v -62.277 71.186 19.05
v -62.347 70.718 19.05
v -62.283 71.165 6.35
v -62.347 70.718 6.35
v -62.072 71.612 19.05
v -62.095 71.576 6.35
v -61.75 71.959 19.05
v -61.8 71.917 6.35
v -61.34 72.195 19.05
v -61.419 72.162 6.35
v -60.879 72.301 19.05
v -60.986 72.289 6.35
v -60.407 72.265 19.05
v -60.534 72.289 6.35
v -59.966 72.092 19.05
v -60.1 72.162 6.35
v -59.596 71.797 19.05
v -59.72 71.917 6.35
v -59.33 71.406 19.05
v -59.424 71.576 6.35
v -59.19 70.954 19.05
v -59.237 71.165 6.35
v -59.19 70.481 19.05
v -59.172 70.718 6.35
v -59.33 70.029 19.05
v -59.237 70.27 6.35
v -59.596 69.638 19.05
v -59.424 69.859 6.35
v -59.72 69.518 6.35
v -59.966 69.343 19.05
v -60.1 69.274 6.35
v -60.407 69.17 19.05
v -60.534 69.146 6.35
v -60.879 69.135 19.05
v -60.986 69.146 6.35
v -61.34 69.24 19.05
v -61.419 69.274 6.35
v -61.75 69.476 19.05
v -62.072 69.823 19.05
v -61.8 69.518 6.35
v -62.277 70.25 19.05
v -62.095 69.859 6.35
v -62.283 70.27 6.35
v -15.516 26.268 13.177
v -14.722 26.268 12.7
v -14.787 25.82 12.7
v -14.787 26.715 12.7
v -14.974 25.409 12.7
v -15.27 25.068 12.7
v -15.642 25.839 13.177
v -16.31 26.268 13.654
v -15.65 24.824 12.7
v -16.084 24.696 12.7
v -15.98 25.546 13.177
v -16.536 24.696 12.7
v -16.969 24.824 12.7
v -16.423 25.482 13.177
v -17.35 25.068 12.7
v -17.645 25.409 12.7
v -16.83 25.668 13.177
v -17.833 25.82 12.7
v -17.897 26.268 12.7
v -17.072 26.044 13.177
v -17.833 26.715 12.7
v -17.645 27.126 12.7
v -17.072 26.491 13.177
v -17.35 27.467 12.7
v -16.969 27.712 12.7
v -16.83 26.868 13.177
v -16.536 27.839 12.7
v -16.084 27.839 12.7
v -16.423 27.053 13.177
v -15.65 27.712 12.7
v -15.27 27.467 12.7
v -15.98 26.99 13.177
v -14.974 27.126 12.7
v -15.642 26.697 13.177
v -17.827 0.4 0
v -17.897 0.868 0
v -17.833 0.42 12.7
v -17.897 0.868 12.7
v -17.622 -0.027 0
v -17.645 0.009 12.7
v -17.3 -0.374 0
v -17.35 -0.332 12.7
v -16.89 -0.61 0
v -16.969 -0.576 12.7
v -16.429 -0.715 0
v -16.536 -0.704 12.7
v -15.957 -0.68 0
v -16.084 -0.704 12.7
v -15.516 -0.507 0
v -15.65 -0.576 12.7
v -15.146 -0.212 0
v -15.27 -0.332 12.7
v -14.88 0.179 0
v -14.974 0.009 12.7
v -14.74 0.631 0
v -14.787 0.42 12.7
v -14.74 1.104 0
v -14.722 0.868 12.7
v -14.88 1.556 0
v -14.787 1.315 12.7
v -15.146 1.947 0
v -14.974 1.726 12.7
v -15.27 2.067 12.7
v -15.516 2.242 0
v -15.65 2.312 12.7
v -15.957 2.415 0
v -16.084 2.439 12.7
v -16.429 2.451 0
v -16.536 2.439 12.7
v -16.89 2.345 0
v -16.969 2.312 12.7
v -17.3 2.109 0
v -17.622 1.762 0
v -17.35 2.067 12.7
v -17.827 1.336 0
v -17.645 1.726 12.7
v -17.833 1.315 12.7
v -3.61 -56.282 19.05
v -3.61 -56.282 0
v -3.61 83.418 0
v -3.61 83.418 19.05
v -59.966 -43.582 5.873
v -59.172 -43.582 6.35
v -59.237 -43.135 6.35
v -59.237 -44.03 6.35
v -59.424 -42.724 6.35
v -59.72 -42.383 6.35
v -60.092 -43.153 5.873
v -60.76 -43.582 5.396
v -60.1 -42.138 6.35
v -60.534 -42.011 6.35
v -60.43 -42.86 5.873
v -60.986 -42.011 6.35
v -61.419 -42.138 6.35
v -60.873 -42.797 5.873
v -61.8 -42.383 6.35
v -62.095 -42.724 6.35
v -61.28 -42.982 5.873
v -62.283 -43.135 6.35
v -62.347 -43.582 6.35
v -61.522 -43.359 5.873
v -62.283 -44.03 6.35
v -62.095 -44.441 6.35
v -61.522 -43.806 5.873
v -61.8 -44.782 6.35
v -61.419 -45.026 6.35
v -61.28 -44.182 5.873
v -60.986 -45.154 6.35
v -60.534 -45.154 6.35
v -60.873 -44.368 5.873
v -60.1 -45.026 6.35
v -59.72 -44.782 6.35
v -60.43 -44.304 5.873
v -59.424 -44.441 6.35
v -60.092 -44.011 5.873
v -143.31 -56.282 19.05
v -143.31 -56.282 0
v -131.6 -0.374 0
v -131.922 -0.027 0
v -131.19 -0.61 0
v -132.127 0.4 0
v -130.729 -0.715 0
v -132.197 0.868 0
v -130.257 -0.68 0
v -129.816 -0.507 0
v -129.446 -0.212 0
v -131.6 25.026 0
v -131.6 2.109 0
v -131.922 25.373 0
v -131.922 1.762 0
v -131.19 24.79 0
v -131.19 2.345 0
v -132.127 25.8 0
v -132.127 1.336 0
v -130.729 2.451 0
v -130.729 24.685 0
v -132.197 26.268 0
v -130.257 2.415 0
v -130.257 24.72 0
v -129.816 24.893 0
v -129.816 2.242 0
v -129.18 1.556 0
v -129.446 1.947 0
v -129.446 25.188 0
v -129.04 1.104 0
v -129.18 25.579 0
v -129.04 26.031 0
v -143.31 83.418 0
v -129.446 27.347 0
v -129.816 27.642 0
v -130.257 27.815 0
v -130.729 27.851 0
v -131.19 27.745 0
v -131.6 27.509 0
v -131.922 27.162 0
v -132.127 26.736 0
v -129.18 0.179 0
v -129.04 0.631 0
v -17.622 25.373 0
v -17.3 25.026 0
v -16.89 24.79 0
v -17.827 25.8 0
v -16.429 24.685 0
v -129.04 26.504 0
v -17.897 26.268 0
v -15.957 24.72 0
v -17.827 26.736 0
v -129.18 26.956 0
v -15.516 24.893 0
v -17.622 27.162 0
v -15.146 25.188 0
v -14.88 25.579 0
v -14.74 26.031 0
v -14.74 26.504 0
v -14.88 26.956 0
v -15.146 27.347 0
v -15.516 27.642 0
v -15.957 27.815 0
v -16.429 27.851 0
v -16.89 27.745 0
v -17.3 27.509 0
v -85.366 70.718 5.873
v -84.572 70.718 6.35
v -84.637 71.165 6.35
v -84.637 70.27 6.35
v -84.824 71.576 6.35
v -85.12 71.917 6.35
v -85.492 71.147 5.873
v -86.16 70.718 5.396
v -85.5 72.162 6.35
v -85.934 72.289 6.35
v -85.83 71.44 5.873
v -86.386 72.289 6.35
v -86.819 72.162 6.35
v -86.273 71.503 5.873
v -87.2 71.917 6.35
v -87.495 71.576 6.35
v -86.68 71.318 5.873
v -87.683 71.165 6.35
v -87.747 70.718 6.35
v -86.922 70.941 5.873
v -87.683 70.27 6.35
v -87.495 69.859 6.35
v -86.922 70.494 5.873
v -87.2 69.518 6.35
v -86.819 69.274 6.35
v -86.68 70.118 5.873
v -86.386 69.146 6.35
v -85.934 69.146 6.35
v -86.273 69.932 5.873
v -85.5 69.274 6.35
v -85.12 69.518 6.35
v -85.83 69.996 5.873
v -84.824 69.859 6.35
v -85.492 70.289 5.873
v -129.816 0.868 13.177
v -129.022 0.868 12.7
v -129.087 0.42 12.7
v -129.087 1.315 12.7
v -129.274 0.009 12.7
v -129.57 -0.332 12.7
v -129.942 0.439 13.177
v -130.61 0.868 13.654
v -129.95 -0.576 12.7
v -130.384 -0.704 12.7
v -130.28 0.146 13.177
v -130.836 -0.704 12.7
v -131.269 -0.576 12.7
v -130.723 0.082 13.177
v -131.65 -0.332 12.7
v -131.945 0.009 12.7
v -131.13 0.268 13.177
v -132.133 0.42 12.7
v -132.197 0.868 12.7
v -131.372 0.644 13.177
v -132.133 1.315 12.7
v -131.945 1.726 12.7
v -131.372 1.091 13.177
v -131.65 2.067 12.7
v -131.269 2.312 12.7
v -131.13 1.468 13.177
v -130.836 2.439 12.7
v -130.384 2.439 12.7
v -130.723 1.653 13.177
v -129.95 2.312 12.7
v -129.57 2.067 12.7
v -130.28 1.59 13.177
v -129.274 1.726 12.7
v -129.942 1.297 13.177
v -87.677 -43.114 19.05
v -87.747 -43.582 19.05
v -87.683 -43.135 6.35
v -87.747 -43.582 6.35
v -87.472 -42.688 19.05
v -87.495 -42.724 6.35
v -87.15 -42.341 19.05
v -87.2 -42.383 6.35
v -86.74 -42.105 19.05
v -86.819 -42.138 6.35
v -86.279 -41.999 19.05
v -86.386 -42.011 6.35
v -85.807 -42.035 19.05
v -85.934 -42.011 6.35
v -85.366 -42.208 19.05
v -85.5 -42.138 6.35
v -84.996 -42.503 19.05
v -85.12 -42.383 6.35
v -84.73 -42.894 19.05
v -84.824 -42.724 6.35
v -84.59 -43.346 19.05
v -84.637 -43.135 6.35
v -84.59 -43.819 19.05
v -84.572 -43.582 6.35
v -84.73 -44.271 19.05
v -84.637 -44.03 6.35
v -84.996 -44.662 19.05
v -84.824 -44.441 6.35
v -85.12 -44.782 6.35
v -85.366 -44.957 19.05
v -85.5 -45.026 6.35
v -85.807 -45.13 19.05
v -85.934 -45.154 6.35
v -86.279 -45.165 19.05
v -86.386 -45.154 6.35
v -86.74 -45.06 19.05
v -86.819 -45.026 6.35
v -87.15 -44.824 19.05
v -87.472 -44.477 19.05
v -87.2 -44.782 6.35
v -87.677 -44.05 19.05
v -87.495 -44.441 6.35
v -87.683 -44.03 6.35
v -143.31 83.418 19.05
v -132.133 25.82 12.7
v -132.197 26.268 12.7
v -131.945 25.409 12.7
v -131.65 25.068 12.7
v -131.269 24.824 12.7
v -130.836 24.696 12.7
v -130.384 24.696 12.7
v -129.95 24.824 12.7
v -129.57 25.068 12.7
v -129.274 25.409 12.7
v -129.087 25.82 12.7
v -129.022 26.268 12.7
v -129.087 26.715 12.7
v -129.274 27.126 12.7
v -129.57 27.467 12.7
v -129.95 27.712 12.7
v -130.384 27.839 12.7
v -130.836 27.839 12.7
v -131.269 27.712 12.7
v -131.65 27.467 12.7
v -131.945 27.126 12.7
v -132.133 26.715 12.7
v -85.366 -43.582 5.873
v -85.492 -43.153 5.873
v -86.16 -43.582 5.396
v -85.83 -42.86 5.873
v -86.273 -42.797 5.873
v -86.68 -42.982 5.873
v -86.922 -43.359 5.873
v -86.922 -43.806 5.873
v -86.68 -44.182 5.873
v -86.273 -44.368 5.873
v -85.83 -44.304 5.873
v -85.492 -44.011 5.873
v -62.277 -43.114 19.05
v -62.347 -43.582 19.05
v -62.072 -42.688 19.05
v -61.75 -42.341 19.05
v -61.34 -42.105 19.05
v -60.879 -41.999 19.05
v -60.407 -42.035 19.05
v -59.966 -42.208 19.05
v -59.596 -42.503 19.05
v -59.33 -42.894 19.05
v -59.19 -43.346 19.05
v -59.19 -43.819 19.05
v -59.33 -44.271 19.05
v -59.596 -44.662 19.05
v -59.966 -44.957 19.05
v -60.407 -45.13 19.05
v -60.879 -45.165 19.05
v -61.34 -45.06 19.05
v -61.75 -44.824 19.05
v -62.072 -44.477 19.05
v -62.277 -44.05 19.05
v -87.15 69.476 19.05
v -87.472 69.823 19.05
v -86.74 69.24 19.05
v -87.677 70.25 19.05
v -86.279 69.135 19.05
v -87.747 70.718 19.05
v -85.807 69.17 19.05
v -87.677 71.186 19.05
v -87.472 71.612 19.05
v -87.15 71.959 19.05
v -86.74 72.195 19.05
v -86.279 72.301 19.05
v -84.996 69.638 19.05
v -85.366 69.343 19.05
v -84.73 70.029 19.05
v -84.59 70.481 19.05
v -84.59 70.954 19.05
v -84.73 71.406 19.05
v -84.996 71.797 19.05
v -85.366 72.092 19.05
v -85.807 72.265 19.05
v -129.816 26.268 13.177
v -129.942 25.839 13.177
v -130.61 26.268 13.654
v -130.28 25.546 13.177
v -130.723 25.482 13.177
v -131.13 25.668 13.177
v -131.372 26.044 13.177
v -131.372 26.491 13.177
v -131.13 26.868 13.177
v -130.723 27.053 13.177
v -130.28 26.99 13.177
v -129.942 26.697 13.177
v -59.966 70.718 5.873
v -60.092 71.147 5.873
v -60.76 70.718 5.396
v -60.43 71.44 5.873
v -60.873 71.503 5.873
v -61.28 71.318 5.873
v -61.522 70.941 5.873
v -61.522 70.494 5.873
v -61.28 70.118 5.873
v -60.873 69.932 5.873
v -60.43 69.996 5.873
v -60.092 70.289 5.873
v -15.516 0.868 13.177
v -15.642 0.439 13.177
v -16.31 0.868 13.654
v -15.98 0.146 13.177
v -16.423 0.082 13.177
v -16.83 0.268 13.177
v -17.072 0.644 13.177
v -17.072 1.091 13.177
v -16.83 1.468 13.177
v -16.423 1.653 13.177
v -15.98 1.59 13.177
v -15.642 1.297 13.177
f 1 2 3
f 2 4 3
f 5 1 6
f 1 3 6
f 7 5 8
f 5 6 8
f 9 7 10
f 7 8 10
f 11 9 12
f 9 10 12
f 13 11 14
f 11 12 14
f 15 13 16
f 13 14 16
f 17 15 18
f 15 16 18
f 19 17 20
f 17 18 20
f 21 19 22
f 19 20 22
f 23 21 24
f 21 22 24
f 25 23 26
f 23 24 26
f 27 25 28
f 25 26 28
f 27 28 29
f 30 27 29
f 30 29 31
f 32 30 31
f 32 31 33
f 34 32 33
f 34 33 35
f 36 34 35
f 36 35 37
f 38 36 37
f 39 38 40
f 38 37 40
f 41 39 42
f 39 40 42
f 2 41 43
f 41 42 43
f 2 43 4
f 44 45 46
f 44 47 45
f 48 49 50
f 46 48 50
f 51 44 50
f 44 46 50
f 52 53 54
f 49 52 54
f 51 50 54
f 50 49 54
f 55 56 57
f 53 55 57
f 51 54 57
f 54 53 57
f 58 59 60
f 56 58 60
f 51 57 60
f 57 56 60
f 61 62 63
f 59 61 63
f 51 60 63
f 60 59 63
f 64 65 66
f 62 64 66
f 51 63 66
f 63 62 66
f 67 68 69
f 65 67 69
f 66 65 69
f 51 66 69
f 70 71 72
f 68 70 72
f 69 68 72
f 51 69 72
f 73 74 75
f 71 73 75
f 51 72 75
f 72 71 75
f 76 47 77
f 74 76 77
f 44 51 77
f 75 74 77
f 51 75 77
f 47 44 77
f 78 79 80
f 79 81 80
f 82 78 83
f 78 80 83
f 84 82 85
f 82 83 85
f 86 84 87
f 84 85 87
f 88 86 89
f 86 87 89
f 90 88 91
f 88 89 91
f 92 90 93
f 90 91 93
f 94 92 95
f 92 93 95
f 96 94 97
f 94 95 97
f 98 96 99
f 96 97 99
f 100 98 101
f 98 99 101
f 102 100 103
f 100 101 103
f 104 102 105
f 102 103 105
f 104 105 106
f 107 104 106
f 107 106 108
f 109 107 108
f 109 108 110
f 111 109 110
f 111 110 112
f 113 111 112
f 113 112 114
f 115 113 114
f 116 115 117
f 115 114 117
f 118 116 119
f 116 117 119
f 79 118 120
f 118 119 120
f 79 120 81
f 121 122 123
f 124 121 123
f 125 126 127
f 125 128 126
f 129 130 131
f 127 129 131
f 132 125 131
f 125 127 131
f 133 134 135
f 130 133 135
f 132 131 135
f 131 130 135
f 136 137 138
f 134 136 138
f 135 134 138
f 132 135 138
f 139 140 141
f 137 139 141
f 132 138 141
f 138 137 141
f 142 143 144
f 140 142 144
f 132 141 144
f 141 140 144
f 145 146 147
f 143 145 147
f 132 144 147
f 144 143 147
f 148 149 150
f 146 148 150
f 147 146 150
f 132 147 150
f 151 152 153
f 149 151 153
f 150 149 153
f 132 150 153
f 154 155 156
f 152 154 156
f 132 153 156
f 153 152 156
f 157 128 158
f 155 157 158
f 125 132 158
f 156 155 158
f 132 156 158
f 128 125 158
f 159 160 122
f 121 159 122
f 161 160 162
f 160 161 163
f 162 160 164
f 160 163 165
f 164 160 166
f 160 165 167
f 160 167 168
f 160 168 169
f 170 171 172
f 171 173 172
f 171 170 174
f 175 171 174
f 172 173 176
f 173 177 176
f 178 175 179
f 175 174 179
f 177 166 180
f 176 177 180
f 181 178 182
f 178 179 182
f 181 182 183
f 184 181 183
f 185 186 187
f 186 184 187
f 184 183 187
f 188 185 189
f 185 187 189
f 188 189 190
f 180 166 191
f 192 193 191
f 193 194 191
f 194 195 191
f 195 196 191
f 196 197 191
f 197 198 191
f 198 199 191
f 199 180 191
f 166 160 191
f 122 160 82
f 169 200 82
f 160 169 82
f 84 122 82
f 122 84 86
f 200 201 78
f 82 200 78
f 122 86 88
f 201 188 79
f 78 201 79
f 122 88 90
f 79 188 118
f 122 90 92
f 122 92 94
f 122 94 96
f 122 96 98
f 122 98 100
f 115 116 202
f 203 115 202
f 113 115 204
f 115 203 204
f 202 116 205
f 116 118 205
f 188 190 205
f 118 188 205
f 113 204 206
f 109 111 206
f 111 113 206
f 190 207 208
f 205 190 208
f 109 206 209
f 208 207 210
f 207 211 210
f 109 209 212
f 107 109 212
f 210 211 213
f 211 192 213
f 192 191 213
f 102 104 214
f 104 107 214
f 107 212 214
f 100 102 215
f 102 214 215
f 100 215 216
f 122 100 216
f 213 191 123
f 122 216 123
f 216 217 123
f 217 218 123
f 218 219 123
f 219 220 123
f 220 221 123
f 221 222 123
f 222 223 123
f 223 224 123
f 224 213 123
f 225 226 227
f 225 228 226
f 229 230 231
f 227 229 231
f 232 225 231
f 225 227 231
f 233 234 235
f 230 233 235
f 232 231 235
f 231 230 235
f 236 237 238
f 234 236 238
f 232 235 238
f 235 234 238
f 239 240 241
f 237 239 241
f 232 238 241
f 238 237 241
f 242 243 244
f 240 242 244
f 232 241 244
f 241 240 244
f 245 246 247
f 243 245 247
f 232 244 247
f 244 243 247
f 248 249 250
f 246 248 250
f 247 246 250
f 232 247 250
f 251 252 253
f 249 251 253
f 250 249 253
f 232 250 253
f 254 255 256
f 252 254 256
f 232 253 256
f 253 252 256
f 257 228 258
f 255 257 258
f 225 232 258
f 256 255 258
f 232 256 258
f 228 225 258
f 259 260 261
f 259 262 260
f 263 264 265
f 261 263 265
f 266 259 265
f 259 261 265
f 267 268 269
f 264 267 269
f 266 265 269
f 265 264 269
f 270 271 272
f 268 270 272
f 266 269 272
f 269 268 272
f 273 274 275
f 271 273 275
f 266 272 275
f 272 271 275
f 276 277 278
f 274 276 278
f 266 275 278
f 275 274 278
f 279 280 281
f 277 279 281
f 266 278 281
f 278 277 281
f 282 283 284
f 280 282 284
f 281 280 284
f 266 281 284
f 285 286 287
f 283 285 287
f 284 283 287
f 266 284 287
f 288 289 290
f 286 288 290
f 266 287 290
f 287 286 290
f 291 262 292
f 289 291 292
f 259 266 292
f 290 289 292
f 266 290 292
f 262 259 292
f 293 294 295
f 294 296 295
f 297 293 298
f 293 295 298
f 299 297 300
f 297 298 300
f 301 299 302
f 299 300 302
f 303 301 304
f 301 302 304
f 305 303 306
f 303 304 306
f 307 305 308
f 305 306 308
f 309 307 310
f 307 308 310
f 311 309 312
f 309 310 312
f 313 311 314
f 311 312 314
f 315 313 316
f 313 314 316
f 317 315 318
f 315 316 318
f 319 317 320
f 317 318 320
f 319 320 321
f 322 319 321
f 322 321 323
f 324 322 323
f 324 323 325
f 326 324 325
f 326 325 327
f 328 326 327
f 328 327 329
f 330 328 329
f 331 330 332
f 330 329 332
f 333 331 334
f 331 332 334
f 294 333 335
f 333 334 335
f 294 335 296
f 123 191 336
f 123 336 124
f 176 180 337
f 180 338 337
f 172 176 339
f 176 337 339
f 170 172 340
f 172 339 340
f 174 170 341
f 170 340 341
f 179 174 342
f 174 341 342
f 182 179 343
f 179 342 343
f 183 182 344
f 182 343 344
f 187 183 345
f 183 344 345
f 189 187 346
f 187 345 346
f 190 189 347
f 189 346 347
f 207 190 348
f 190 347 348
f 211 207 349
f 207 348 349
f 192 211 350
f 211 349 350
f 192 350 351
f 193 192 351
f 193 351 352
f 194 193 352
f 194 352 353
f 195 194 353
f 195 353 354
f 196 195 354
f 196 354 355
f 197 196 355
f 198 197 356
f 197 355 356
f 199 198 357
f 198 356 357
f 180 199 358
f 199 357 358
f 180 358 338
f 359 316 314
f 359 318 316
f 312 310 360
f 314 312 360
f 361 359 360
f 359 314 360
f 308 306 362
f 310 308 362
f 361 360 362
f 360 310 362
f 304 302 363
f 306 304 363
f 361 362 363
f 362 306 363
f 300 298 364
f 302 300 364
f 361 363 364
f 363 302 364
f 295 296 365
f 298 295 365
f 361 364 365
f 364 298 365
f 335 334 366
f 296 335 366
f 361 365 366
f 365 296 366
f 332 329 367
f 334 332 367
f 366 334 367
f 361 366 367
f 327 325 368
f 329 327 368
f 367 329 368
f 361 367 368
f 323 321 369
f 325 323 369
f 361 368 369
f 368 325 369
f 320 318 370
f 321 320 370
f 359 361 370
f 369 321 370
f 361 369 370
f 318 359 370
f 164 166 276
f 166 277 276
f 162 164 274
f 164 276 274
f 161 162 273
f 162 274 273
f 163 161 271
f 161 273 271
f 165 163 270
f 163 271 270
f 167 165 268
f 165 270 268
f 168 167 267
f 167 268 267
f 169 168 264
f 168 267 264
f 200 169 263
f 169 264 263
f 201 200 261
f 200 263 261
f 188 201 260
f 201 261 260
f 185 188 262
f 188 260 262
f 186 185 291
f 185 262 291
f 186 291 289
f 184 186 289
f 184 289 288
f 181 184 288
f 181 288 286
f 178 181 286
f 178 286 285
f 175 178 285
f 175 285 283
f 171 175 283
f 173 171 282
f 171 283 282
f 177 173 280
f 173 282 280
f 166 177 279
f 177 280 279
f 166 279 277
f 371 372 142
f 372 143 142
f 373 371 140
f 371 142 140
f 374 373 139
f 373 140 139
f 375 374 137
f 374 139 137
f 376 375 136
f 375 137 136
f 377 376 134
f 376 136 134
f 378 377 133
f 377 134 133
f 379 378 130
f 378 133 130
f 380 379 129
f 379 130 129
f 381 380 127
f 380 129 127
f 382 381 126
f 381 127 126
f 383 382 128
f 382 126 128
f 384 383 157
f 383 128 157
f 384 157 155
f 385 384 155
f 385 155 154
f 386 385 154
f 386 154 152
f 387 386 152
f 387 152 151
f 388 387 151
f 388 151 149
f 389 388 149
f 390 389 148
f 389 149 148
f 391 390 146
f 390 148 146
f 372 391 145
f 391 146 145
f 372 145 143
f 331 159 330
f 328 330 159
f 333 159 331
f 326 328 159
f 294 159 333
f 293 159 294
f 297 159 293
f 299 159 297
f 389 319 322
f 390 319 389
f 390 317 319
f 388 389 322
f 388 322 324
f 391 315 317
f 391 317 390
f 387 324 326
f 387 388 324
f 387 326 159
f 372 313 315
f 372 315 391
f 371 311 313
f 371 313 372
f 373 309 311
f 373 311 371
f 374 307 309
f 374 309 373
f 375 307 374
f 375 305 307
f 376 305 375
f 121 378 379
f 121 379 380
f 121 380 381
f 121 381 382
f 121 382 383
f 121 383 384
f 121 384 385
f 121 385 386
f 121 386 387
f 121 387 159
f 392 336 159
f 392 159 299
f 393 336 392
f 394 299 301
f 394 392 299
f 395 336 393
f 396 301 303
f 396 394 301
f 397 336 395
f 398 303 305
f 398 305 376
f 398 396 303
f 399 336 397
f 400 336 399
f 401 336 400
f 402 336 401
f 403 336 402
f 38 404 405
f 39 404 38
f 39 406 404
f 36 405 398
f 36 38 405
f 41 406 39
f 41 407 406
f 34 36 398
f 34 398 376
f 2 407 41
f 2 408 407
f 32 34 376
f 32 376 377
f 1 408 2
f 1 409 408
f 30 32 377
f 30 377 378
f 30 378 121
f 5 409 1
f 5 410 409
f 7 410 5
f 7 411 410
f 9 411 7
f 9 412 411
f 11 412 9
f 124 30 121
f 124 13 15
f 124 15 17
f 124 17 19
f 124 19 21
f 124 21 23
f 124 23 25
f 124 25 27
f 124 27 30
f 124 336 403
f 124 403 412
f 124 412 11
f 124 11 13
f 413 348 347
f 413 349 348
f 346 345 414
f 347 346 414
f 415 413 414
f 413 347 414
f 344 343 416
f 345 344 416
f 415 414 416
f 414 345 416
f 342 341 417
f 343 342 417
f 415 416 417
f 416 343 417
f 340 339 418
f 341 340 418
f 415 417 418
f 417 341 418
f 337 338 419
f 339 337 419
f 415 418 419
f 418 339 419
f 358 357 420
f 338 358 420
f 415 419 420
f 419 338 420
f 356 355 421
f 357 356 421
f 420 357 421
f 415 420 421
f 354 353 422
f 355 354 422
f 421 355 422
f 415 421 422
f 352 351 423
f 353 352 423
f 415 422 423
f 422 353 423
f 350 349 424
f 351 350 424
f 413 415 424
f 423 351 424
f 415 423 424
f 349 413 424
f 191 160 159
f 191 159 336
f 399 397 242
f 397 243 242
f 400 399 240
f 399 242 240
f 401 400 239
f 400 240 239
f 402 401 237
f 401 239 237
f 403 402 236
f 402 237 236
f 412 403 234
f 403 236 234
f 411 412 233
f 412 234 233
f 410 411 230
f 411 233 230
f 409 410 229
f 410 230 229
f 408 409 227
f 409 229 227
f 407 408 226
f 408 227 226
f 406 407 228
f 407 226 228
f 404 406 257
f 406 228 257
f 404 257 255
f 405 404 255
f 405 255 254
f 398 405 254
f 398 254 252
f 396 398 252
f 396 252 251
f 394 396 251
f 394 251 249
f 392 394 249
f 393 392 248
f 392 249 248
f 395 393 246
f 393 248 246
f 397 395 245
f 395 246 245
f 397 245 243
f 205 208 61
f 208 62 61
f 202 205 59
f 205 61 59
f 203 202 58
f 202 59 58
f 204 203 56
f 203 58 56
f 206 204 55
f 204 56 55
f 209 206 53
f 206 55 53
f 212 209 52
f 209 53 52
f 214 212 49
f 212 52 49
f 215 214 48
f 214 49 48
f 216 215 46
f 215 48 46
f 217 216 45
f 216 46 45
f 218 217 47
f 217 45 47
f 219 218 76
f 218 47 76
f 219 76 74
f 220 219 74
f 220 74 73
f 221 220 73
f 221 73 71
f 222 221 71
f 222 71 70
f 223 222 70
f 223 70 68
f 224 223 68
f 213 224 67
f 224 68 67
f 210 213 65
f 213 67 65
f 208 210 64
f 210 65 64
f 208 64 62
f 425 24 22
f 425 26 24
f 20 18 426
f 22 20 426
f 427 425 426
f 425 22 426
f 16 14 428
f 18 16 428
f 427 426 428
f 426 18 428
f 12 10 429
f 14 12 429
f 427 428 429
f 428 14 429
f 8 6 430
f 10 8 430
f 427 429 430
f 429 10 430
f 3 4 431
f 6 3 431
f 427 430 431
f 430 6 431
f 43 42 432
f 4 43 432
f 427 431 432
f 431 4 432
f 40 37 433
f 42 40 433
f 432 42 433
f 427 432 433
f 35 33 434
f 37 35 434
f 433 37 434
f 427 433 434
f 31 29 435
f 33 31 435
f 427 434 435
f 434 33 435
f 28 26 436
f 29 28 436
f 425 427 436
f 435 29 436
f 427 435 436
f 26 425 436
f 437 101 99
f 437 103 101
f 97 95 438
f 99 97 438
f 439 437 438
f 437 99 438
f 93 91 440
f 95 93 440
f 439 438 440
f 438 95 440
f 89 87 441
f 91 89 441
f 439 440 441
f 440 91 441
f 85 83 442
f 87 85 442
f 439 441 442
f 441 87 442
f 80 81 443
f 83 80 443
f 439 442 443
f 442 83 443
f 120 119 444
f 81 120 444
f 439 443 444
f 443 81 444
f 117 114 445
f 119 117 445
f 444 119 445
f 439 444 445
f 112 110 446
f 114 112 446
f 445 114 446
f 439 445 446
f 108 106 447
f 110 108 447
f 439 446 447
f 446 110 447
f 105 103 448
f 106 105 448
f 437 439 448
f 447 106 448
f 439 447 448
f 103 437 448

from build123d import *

# Parameters (mm, degrees)
F0_W     = 139.7
F0_H     = 139.7
F1_DEPTH = 19.05
F3_D     = 3.175
F3_DEPTH = 12.7
F3_TIP   = 0.9538662327
F5_D     = 3.175
F5_DEPTH = 12.7
F5_TIP   = 0.9538662327


with BuildPart() as f1:
    # F0 (on Top) → F1 (new body)
    with BuildSketch(Plane.XY):
        with Locations((-73.4599325806, 13.567644133)):
            Rectangle(F0_W, F0_H)
    extrude(amount=F1_DEPTH)

    # F3
    with Locations(Plane.XY.offset(19.05)):
        with Locations((-86.1599325806, 70.717644133), (-60.7599325806, 70.717644133), (-60.7599325806, -43.582355867), (-86.1599325806, -43.582355867)):
            Hole(F3_D / 2, depth=F3_DEPTH)
            with Locations((0, 0, -(F3_DEPTH + F3_TIP / 2))):  # 118° drill point
                Cone(0, F3_D / 2, F3_TIP, mode=Mode.SUBTRACT)

    # F5
    with Locations(Plane(origin=(0, 0, 0), x_dir=(1, 0, 0), z_dir=(0, 0, -1))):
        with Locations((-130.6099325806, -26.267644133), (-130.6099325806, -0.867644133), (-16.3099325806, -26.267644133), (-16.3099325806, -0.867644133)):
            Hole(F5_D / 2, depth=F5_DEPTH)
            with Locations((0, 0, -(F5_DEPTH + F5_TIP / 2))):  # 118° drill point
                Cone(0, F5_D / 2, F5_TIP, mode=Mode.SUBTRACT)


solid = f1.part
